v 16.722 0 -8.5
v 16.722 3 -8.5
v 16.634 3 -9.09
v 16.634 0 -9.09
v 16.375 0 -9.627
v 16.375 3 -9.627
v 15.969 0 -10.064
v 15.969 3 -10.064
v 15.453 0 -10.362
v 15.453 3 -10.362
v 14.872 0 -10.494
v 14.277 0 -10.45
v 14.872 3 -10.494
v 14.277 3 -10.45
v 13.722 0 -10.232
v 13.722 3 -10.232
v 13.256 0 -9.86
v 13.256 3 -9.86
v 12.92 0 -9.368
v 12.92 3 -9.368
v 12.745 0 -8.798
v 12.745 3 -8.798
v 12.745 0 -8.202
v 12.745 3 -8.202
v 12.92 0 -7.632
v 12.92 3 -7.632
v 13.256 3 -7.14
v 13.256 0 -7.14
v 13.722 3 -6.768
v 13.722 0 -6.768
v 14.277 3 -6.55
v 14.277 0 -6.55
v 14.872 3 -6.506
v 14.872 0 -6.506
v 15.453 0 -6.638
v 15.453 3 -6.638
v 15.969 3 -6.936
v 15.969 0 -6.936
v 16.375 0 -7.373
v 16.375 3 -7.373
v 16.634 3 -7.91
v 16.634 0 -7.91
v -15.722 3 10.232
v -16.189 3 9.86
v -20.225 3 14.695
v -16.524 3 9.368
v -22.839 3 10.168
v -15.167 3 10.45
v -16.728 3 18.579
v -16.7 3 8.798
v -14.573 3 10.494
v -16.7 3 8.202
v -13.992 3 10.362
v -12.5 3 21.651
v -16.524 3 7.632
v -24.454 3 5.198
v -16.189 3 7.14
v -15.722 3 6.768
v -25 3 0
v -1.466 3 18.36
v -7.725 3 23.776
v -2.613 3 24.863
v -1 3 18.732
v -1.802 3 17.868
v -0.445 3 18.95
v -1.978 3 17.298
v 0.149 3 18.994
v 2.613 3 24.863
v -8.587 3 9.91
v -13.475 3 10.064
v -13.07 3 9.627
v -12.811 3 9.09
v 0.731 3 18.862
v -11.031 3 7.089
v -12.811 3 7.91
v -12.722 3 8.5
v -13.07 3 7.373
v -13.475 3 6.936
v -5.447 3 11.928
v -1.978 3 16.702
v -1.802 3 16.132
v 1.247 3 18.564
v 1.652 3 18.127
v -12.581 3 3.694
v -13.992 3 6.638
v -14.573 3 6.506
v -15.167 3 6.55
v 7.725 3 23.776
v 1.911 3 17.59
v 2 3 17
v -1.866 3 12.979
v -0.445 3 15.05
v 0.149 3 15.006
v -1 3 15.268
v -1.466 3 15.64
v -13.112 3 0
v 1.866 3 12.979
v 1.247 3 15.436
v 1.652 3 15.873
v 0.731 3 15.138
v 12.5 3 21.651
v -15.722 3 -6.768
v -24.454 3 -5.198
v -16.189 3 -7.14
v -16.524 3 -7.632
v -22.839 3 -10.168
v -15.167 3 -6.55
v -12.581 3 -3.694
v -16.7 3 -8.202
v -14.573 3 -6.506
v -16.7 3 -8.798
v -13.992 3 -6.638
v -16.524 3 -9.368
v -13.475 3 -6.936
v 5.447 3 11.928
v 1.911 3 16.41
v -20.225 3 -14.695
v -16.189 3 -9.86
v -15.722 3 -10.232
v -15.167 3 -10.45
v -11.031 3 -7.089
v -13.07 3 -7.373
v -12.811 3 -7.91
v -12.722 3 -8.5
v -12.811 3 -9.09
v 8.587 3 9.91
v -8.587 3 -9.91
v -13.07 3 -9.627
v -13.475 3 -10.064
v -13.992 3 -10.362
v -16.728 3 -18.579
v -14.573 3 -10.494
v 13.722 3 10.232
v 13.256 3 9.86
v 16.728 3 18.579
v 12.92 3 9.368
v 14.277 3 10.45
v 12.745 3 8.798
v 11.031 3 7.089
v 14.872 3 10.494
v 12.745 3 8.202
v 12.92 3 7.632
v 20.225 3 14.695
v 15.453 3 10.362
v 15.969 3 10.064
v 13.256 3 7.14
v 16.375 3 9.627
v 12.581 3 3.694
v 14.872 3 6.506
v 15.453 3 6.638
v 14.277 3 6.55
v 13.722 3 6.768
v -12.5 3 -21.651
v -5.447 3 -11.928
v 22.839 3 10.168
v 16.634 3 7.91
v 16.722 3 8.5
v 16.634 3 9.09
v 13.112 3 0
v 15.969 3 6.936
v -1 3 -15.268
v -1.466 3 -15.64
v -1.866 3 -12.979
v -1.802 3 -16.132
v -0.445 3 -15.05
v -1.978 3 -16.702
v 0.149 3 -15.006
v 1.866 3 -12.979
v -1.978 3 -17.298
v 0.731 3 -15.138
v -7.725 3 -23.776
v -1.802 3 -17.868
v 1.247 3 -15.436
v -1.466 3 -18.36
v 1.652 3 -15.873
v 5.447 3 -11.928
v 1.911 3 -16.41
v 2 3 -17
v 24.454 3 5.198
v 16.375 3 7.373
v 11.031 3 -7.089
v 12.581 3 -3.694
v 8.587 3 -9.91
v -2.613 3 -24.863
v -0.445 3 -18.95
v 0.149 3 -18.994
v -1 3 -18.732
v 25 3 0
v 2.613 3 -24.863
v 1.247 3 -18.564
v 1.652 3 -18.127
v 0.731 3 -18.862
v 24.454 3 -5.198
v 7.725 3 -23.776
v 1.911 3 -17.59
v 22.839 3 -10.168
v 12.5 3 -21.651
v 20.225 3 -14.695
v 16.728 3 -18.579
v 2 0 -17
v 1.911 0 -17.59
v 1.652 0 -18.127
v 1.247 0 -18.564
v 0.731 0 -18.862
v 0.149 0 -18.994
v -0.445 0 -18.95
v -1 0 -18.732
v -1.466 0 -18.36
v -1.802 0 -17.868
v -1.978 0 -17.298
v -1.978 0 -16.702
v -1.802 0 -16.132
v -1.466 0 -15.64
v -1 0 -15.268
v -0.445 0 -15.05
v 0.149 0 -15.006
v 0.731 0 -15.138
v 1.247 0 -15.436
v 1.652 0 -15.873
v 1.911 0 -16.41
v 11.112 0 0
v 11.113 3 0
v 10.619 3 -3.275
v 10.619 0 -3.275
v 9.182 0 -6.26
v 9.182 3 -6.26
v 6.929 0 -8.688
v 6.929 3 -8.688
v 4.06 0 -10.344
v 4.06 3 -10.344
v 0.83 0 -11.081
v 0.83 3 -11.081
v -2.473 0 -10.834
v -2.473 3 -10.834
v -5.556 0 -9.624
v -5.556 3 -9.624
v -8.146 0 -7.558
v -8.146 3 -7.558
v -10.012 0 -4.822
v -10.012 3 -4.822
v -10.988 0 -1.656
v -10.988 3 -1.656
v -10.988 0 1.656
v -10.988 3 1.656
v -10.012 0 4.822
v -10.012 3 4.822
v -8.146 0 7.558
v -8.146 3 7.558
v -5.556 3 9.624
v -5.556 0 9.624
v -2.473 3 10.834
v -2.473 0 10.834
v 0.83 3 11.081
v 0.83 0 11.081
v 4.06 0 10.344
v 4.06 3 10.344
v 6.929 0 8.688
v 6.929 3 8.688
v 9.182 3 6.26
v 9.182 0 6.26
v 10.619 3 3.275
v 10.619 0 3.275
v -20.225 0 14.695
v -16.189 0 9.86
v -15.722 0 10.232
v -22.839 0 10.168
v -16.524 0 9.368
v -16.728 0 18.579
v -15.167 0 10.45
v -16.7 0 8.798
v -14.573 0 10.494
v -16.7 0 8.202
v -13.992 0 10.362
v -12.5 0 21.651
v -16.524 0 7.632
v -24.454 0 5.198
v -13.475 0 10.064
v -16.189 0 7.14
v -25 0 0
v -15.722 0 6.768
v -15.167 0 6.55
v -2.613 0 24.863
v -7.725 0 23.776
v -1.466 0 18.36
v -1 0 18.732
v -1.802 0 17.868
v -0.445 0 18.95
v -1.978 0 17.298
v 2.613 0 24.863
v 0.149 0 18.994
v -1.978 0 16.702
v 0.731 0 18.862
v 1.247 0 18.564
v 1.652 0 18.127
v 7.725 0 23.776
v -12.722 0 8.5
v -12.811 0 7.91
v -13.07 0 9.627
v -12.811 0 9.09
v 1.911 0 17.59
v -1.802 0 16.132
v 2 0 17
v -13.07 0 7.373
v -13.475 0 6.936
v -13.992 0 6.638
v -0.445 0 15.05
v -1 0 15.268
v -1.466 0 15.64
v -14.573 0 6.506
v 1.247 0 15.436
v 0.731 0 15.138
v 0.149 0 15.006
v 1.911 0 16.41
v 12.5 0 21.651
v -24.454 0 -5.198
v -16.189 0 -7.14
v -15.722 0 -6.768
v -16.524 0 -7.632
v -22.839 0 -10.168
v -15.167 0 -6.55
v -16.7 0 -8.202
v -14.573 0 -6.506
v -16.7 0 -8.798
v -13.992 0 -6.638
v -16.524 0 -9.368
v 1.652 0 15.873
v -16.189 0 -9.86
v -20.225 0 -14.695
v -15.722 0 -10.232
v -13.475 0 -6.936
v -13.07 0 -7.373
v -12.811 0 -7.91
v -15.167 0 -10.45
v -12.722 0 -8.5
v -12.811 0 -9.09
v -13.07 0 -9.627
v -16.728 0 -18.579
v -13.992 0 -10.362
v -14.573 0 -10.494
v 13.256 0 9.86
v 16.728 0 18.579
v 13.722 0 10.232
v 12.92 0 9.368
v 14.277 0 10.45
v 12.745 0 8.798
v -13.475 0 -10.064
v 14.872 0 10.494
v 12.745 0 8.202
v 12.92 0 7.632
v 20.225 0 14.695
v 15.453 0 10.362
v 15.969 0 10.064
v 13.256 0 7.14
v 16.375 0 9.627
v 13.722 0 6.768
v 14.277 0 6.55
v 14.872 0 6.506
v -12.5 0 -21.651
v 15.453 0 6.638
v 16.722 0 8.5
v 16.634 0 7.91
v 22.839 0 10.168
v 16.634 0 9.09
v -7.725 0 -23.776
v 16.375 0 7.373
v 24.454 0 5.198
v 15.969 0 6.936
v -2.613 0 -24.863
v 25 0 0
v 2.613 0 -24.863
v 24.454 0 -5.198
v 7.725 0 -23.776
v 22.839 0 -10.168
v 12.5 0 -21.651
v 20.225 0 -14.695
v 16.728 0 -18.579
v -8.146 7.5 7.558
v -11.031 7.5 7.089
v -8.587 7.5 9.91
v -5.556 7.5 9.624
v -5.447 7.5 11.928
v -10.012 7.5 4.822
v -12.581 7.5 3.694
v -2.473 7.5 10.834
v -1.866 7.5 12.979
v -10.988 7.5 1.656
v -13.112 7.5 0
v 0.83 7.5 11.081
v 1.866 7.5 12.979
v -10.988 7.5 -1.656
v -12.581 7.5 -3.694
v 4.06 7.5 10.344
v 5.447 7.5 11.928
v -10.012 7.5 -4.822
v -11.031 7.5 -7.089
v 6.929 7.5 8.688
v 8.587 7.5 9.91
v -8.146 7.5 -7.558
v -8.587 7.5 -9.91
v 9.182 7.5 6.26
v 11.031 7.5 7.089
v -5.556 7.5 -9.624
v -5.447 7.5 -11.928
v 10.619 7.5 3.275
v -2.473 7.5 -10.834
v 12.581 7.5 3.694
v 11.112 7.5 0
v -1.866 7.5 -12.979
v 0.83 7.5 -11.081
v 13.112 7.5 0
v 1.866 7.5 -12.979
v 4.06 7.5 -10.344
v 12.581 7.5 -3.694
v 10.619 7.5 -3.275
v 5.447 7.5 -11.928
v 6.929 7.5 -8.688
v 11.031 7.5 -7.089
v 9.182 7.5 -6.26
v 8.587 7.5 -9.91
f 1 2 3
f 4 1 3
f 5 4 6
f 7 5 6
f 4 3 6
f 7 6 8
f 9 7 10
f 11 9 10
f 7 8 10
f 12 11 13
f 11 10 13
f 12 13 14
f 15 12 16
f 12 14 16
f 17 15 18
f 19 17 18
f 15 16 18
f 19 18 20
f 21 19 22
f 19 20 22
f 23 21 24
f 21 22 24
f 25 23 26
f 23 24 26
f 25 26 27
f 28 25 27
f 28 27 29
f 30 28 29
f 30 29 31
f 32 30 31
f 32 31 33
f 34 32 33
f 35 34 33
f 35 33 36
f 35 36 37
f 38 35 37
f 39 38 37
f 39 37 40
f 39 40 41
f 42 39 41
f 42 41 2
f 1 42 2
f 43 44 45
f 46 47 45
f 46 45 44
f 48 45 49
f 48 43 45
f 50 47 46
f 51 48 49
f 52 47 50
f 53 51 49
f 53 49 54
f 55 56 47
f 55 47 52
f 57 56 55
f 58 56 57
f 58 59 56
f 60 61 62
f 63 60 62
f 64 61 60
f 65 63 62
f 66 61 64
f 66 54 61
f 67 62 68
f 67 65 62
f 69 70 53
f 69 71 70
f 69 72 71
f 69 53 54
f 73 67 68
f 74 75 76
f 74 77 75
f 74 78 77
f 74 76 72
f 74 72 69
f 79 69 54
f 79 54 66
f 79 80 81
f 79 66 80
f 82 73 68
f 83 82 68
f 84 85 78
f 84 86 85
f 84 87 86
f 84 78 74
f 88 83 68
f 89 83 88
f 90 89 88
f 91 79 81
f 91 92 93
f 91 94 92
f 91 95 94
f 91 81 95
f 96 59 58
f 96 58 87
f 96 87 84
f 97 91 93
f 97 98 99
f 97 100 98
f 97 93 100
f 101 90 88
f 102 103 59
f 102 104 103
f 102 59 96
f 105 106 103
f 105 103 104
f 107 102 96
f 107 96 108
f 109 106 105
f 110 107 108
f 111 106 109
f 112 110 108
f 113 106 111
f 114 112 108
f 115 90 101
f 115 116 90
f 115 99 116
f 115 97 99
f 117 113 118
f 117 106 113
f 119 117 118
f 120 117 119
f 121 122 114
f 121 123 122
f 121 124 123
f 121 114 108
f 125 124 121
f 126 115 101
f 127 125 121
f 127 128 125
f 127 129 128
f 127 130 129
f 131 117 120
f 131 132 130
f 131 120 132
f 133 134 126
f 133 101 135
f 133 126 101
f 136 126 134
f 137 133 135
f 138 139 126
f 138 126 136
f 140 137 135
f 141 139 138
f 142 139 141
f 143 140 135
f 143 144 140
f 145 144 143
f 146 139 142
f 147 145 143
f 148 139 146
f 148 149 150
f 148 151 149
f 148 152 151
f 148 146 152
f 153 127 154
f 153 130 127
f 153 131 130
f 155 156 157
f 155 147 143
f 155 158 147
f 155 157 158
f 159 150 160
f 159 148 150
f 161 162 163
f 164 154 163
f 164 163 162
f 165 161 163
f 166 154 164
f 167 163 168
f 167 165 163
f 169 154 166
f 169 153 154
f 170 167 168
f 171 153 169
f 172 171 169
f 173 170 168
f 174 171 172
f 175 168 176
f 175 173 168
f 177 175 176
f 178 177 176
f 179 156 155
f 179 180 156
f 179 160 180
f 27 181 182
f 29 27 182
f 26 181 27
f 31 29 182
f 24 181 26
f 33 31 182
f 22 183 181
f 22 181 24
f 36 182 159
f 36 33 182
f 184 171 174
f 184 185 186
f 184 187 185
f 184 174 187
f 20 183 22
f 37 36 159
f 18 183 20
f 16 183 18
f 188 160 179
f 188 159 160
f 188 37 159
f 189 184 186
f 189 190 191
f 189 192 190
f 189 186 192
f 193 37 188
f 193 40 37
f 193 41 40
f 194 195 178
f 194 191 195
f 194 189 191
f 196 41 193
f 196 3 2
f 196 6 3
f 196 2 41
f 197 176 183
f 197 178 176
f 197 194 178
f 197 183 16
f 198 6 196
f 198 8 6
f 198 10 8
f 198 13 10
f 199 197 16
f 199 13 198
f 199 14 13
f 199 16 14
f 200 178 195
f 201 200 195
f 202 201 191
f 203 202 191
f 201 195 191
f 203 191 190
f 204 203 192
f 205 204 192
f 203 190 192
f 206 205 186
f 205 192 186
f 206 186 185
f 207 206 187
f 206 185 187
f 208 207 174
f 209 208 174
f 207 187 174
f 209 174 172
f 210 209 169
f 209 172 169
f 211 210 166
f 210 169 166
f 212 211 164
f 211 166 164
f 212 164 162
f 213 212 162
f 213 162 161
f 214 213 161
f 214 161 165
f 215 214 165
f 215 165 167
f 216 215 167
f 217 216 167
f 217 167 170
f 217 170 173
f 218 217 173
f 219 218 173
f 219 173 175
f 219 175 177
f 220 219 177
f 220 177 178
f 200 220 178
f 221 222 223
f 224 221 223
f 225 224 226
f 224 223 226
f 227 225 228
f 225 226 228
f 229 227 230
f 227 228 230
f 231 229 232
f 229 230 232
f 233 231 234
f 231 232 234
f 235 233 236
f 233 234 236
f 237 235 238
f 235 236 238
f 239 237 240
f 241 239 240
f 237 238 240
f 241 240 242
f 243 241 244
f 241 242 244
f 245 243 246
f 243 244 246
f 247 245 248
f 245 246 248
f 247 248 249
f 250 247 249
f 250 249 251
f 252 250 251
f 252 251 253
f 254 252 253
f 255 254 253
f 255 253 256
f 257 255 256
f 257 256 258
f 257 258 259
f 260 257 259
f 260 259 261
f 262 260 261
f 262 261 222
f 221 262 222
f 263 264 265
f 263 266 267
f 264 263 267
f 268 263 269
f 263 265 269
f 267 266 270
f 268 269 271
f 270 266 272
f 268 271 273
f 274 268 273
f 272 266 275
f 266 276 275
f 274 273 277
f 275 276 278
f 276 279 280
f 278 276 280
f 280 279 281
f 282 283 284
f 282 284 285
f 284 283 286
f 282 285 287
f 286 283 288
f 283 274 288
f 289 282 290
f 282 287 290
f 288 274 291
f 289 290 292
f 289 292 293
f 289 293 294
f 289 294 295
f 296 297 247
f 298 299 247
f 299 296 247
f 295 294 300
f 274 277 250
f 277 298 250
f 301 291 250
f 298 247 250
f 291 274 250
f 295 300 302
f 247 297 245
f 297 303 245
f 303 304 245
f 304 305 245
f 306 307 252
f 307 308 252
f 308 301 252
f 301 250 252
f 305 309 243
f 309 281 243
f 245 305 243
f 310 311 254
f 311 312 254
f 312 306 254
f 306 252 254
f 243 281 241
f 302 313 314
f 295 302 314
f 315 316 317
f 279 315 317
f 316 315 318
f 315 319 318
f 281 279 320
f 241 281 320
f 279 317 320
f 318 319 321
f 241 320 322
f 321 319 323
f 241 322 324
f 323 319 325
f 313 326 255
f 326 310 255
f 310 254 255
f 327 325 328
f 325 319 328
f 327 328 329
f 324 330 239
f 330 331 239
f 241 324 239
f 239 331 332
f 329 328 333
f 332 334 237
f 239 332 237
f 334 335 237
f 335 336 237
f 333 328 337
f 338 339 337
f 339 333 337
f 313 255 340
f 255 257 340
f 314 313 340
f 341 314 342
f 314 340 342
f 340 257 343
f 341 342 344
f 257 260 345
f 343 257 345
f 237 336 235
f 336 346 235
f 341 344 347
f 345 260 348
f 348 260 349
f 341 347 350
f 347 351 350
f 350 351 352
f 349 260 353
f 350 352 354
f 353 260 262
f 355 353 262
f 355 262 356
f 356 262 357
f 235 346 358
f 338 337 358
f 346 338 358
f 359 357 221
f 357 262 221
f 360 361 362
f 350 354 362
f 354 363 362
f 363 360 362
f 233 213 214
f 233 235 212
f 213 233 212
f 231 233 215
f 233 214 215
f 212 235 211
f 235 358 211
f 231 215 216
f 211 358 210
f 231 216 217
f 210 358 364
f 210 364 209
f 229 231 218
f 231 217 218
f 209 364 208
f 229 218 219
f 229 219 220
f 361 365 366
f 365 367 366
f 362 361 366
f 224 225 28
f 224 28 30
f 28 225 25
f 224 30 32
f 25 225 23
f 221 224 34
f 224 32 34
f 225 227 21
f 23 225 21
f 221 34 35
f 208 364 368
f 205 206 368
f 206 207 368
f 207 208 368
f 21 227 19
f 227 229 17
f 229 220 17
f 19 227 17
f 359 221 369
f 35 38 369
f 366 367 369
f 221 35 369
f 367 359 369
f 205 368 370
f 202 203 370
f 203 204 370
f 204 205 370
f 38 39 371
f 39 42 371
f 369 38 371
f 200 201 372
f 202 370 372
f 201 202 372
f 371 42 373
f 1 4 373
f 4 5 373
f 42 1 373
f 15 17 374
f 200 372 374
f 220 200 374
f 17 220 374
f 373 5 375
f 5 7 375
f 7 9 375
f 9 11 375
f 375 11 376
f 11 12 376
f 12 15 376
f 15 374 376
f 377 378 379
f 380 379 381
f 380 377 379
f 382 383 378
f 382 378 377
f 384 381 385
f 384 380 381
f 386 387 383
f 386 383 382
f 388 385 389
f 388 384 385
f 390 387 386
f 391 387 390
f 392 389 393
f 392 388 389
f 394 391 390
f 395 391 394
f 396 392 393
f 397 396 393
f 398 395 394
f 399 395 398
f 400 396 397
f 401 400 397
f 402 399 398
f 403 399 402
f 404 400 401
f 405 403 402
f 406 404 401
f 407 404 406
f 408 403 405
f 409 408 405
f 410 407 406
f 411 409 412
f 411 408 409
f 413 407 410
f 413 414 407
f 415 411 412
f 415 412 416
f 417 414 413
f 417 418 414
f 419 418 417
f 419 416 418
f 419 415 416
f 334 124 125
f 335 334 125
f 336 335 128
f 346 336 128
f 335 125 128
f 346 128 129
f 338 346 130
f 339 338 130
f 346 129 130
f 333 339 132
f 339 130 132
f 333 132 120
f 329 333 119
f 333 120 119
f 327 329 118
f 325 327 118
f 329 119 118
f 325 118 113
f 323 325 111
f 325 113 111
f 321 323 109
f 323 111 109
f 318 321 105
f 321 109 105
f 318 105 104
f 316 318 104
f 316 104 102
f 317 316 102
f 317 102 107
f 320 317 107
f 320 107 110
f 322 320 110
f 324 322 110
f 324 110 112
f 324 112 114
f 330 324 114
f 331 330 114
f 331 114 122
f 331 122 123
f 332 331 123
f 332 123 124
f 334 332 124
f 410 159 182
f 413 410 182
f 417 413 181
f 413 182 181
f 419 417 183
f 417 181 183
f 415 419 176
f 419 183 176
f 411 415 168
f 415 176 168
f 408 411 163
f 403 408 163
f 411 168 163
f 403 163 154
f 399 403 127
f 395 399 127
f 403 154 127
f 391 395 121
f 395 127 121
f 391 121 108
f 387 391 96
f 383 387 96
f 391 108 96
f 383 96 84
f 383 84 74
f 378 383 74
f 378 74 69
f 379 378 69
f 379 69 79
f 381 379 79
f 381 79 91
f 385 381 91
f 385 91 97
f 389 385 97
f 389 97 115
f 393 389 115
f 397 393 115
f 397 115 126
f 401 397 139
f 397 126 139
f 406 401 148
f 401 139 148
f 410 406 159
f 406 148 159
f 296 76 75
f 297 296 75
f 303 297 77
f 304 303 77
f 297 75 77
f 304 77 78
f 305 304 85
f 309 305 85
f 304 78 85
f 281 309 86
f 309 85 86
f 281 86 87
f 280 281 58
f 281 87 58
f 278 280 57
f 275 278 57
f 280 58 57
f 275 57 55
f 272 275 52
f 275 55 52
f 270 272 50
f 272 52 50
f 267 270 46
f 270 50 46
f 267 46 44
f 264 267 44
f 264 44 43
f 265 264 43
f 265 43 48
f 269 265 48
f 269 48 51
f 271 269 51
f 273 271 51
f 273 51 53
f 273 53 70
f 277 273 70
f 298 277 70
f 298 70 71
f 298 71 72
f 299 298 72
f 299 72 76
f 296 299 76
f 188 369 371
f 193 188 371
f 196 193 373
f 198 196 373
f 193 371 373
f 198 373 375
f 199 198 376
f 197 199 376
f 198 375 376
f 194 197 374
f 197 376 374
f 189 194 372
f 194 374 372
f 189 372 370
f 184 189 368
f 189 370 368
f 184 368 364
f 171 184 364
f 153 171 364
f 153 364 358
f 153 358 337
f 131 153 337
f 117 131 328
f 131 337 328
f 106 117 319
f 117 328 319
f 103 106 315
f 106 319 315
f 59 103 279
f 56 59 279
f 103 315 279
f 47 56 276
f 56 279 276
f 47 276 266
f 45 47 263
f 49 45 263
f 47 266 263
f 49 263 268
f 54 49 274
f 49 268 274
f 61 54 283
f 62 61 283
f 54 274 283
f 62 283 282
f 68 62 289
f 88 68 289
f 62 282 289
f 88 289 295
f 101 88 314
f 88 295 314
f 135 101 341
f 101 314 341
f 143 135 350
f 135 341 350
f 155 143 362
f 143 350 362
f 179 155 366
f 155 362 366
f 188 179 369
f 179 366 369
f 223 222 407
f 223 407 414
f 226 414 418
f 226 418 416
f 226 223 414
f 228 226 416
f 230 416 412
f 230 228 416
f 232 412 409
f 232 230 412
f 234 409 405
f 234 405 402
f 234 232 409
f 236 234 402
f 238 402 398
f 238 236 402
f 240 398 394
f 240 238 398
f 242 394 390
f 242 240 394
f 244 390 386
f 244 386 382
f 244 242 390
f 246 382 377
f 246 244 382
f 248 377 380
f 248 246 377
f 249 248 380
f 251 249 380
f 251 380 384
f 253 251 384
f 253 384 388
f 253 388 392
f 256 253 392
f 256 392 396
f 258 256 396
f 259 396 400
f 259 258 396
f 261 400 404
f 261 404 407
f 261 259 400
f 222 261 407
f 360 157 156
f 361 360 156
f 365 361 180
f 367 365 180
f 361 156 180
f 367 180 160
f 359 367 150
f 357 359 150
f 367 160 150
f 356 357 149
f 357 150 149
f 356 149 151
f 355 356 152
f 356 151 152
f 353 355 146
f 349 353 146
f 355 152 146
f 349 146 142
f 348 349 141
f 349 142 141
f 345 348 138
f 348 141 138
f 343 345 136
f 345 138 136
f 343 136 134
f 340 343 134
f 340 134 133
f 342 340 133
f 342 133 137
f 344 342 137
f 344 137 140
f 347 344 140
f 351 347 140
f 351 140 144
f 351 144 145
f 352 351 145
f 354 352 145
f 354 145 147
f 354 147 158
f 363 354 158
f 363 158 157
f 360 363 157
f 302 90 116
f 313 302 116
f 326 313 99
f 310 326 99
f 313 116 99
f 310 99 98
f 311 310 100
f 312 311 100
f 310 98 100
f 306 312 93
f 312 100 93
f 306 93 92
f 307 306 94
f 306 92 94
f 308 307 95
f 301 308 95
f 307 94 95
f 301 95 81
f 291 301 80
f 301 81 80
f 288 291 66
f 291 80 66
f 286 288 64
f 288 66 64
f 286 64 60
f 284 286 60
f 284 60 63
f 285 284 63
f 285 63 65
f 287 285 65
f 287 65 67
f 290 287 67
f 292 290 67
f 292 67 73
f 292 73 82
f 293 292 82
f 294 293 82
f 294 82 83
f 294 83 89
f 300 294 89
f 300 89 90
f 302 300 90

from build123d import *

# Parameters (mm, degrees)
CROQUIS1_R              = 25
CROQUIS1_R_2            = 4.7625
SALIENTE_EXTRUIR1_DEPTH = 3
CROQUIS2_R              = 2
CORTAR_EXTRUIR1_DEPTH   = 4
CROQUIS3_R              = 13.1125
CROQUIS3_R_2            = 11.1125
SALIENTE_EXTRUIR2_DEPTH = 4.5
CROQUIS3_2_R            = 11.1125
CROQUIS3_2_R_2          = 4.7625
CORTAR_EXTRUIR2_DEPTH   = 4


with BuildPart() as part:
    # Croquis1 → Saliente-Extruir1 (new body)
    with BuildSketch(Plane(origin=(0, 0, 0), x_dir=(1, 0, 0), z_dir=(0, 1, 0))):
        Circle(CROQUIS1_R)
        Circle(CROQUIS1_R_2, mode=Mode.SUBTRACT)
    extrude(amount=SALIENTE_EXTRUIR1_DEPTH)

    # Croquis2 → Cortar-Extruir1 (cut, through all)
    with BuildSketch(Plane(origin=(0, 3, 0), x_dir=(1, 0, 0), z_dir=(0, 1, 0))):
        with Locations((0, 17)):
            Circle(CROQUIS2_R)
        with Locations((14.722431864, 8.5)):
            Circle(CROQUIS2_R)
        with Locations((14.722431864, -8.5)):
            Circle(CROQUIS2_R)
        with Locations((0, -17)):
            Circle(CROQUIS2_R)
        with Locations((-14.722431864, -8.5)):
            Circle(CROQUIS2_R)
        with Locations((-14.722431864, 8.5)):
            Circle(CROQUIS2_R)
    extrude(amount=-CORTAR_EXTRUIR1_DEPTH, mode=Mode.SUBTRACT)

    # Croquis3 → Saliente-Extruir2 (add)
    with BuildSketch(Plane(origin=(0, 3, 0), x_dir=(1, 0, 0), z_dir=(0, 1, 0))):
        Circle(CROQUIS3_R)
        Circle(CROQUIS3_R_2, mode=Mode.SUBTRACT)
    extrude(amount=SALIENTE_EXTRUIR2_DEPTH)

    # Croquis3<2> → Cortar-Extruir2 (cut, through all)
    with BuildSketch(Plane(origin=(0, 3, 0), x_dir=(1, 0, 0), z_dir=(0, 1, 0))):
        Circle(CROQUIS3_2_R)
        Circle(CROQUIS3_2_R_2, mode=Mode.SUBTRACT)
    extrude(amount=-CORTAR_EXTRUIR2_DEPTH, mode=Mode.SUBTRACT)


solid = part.part
